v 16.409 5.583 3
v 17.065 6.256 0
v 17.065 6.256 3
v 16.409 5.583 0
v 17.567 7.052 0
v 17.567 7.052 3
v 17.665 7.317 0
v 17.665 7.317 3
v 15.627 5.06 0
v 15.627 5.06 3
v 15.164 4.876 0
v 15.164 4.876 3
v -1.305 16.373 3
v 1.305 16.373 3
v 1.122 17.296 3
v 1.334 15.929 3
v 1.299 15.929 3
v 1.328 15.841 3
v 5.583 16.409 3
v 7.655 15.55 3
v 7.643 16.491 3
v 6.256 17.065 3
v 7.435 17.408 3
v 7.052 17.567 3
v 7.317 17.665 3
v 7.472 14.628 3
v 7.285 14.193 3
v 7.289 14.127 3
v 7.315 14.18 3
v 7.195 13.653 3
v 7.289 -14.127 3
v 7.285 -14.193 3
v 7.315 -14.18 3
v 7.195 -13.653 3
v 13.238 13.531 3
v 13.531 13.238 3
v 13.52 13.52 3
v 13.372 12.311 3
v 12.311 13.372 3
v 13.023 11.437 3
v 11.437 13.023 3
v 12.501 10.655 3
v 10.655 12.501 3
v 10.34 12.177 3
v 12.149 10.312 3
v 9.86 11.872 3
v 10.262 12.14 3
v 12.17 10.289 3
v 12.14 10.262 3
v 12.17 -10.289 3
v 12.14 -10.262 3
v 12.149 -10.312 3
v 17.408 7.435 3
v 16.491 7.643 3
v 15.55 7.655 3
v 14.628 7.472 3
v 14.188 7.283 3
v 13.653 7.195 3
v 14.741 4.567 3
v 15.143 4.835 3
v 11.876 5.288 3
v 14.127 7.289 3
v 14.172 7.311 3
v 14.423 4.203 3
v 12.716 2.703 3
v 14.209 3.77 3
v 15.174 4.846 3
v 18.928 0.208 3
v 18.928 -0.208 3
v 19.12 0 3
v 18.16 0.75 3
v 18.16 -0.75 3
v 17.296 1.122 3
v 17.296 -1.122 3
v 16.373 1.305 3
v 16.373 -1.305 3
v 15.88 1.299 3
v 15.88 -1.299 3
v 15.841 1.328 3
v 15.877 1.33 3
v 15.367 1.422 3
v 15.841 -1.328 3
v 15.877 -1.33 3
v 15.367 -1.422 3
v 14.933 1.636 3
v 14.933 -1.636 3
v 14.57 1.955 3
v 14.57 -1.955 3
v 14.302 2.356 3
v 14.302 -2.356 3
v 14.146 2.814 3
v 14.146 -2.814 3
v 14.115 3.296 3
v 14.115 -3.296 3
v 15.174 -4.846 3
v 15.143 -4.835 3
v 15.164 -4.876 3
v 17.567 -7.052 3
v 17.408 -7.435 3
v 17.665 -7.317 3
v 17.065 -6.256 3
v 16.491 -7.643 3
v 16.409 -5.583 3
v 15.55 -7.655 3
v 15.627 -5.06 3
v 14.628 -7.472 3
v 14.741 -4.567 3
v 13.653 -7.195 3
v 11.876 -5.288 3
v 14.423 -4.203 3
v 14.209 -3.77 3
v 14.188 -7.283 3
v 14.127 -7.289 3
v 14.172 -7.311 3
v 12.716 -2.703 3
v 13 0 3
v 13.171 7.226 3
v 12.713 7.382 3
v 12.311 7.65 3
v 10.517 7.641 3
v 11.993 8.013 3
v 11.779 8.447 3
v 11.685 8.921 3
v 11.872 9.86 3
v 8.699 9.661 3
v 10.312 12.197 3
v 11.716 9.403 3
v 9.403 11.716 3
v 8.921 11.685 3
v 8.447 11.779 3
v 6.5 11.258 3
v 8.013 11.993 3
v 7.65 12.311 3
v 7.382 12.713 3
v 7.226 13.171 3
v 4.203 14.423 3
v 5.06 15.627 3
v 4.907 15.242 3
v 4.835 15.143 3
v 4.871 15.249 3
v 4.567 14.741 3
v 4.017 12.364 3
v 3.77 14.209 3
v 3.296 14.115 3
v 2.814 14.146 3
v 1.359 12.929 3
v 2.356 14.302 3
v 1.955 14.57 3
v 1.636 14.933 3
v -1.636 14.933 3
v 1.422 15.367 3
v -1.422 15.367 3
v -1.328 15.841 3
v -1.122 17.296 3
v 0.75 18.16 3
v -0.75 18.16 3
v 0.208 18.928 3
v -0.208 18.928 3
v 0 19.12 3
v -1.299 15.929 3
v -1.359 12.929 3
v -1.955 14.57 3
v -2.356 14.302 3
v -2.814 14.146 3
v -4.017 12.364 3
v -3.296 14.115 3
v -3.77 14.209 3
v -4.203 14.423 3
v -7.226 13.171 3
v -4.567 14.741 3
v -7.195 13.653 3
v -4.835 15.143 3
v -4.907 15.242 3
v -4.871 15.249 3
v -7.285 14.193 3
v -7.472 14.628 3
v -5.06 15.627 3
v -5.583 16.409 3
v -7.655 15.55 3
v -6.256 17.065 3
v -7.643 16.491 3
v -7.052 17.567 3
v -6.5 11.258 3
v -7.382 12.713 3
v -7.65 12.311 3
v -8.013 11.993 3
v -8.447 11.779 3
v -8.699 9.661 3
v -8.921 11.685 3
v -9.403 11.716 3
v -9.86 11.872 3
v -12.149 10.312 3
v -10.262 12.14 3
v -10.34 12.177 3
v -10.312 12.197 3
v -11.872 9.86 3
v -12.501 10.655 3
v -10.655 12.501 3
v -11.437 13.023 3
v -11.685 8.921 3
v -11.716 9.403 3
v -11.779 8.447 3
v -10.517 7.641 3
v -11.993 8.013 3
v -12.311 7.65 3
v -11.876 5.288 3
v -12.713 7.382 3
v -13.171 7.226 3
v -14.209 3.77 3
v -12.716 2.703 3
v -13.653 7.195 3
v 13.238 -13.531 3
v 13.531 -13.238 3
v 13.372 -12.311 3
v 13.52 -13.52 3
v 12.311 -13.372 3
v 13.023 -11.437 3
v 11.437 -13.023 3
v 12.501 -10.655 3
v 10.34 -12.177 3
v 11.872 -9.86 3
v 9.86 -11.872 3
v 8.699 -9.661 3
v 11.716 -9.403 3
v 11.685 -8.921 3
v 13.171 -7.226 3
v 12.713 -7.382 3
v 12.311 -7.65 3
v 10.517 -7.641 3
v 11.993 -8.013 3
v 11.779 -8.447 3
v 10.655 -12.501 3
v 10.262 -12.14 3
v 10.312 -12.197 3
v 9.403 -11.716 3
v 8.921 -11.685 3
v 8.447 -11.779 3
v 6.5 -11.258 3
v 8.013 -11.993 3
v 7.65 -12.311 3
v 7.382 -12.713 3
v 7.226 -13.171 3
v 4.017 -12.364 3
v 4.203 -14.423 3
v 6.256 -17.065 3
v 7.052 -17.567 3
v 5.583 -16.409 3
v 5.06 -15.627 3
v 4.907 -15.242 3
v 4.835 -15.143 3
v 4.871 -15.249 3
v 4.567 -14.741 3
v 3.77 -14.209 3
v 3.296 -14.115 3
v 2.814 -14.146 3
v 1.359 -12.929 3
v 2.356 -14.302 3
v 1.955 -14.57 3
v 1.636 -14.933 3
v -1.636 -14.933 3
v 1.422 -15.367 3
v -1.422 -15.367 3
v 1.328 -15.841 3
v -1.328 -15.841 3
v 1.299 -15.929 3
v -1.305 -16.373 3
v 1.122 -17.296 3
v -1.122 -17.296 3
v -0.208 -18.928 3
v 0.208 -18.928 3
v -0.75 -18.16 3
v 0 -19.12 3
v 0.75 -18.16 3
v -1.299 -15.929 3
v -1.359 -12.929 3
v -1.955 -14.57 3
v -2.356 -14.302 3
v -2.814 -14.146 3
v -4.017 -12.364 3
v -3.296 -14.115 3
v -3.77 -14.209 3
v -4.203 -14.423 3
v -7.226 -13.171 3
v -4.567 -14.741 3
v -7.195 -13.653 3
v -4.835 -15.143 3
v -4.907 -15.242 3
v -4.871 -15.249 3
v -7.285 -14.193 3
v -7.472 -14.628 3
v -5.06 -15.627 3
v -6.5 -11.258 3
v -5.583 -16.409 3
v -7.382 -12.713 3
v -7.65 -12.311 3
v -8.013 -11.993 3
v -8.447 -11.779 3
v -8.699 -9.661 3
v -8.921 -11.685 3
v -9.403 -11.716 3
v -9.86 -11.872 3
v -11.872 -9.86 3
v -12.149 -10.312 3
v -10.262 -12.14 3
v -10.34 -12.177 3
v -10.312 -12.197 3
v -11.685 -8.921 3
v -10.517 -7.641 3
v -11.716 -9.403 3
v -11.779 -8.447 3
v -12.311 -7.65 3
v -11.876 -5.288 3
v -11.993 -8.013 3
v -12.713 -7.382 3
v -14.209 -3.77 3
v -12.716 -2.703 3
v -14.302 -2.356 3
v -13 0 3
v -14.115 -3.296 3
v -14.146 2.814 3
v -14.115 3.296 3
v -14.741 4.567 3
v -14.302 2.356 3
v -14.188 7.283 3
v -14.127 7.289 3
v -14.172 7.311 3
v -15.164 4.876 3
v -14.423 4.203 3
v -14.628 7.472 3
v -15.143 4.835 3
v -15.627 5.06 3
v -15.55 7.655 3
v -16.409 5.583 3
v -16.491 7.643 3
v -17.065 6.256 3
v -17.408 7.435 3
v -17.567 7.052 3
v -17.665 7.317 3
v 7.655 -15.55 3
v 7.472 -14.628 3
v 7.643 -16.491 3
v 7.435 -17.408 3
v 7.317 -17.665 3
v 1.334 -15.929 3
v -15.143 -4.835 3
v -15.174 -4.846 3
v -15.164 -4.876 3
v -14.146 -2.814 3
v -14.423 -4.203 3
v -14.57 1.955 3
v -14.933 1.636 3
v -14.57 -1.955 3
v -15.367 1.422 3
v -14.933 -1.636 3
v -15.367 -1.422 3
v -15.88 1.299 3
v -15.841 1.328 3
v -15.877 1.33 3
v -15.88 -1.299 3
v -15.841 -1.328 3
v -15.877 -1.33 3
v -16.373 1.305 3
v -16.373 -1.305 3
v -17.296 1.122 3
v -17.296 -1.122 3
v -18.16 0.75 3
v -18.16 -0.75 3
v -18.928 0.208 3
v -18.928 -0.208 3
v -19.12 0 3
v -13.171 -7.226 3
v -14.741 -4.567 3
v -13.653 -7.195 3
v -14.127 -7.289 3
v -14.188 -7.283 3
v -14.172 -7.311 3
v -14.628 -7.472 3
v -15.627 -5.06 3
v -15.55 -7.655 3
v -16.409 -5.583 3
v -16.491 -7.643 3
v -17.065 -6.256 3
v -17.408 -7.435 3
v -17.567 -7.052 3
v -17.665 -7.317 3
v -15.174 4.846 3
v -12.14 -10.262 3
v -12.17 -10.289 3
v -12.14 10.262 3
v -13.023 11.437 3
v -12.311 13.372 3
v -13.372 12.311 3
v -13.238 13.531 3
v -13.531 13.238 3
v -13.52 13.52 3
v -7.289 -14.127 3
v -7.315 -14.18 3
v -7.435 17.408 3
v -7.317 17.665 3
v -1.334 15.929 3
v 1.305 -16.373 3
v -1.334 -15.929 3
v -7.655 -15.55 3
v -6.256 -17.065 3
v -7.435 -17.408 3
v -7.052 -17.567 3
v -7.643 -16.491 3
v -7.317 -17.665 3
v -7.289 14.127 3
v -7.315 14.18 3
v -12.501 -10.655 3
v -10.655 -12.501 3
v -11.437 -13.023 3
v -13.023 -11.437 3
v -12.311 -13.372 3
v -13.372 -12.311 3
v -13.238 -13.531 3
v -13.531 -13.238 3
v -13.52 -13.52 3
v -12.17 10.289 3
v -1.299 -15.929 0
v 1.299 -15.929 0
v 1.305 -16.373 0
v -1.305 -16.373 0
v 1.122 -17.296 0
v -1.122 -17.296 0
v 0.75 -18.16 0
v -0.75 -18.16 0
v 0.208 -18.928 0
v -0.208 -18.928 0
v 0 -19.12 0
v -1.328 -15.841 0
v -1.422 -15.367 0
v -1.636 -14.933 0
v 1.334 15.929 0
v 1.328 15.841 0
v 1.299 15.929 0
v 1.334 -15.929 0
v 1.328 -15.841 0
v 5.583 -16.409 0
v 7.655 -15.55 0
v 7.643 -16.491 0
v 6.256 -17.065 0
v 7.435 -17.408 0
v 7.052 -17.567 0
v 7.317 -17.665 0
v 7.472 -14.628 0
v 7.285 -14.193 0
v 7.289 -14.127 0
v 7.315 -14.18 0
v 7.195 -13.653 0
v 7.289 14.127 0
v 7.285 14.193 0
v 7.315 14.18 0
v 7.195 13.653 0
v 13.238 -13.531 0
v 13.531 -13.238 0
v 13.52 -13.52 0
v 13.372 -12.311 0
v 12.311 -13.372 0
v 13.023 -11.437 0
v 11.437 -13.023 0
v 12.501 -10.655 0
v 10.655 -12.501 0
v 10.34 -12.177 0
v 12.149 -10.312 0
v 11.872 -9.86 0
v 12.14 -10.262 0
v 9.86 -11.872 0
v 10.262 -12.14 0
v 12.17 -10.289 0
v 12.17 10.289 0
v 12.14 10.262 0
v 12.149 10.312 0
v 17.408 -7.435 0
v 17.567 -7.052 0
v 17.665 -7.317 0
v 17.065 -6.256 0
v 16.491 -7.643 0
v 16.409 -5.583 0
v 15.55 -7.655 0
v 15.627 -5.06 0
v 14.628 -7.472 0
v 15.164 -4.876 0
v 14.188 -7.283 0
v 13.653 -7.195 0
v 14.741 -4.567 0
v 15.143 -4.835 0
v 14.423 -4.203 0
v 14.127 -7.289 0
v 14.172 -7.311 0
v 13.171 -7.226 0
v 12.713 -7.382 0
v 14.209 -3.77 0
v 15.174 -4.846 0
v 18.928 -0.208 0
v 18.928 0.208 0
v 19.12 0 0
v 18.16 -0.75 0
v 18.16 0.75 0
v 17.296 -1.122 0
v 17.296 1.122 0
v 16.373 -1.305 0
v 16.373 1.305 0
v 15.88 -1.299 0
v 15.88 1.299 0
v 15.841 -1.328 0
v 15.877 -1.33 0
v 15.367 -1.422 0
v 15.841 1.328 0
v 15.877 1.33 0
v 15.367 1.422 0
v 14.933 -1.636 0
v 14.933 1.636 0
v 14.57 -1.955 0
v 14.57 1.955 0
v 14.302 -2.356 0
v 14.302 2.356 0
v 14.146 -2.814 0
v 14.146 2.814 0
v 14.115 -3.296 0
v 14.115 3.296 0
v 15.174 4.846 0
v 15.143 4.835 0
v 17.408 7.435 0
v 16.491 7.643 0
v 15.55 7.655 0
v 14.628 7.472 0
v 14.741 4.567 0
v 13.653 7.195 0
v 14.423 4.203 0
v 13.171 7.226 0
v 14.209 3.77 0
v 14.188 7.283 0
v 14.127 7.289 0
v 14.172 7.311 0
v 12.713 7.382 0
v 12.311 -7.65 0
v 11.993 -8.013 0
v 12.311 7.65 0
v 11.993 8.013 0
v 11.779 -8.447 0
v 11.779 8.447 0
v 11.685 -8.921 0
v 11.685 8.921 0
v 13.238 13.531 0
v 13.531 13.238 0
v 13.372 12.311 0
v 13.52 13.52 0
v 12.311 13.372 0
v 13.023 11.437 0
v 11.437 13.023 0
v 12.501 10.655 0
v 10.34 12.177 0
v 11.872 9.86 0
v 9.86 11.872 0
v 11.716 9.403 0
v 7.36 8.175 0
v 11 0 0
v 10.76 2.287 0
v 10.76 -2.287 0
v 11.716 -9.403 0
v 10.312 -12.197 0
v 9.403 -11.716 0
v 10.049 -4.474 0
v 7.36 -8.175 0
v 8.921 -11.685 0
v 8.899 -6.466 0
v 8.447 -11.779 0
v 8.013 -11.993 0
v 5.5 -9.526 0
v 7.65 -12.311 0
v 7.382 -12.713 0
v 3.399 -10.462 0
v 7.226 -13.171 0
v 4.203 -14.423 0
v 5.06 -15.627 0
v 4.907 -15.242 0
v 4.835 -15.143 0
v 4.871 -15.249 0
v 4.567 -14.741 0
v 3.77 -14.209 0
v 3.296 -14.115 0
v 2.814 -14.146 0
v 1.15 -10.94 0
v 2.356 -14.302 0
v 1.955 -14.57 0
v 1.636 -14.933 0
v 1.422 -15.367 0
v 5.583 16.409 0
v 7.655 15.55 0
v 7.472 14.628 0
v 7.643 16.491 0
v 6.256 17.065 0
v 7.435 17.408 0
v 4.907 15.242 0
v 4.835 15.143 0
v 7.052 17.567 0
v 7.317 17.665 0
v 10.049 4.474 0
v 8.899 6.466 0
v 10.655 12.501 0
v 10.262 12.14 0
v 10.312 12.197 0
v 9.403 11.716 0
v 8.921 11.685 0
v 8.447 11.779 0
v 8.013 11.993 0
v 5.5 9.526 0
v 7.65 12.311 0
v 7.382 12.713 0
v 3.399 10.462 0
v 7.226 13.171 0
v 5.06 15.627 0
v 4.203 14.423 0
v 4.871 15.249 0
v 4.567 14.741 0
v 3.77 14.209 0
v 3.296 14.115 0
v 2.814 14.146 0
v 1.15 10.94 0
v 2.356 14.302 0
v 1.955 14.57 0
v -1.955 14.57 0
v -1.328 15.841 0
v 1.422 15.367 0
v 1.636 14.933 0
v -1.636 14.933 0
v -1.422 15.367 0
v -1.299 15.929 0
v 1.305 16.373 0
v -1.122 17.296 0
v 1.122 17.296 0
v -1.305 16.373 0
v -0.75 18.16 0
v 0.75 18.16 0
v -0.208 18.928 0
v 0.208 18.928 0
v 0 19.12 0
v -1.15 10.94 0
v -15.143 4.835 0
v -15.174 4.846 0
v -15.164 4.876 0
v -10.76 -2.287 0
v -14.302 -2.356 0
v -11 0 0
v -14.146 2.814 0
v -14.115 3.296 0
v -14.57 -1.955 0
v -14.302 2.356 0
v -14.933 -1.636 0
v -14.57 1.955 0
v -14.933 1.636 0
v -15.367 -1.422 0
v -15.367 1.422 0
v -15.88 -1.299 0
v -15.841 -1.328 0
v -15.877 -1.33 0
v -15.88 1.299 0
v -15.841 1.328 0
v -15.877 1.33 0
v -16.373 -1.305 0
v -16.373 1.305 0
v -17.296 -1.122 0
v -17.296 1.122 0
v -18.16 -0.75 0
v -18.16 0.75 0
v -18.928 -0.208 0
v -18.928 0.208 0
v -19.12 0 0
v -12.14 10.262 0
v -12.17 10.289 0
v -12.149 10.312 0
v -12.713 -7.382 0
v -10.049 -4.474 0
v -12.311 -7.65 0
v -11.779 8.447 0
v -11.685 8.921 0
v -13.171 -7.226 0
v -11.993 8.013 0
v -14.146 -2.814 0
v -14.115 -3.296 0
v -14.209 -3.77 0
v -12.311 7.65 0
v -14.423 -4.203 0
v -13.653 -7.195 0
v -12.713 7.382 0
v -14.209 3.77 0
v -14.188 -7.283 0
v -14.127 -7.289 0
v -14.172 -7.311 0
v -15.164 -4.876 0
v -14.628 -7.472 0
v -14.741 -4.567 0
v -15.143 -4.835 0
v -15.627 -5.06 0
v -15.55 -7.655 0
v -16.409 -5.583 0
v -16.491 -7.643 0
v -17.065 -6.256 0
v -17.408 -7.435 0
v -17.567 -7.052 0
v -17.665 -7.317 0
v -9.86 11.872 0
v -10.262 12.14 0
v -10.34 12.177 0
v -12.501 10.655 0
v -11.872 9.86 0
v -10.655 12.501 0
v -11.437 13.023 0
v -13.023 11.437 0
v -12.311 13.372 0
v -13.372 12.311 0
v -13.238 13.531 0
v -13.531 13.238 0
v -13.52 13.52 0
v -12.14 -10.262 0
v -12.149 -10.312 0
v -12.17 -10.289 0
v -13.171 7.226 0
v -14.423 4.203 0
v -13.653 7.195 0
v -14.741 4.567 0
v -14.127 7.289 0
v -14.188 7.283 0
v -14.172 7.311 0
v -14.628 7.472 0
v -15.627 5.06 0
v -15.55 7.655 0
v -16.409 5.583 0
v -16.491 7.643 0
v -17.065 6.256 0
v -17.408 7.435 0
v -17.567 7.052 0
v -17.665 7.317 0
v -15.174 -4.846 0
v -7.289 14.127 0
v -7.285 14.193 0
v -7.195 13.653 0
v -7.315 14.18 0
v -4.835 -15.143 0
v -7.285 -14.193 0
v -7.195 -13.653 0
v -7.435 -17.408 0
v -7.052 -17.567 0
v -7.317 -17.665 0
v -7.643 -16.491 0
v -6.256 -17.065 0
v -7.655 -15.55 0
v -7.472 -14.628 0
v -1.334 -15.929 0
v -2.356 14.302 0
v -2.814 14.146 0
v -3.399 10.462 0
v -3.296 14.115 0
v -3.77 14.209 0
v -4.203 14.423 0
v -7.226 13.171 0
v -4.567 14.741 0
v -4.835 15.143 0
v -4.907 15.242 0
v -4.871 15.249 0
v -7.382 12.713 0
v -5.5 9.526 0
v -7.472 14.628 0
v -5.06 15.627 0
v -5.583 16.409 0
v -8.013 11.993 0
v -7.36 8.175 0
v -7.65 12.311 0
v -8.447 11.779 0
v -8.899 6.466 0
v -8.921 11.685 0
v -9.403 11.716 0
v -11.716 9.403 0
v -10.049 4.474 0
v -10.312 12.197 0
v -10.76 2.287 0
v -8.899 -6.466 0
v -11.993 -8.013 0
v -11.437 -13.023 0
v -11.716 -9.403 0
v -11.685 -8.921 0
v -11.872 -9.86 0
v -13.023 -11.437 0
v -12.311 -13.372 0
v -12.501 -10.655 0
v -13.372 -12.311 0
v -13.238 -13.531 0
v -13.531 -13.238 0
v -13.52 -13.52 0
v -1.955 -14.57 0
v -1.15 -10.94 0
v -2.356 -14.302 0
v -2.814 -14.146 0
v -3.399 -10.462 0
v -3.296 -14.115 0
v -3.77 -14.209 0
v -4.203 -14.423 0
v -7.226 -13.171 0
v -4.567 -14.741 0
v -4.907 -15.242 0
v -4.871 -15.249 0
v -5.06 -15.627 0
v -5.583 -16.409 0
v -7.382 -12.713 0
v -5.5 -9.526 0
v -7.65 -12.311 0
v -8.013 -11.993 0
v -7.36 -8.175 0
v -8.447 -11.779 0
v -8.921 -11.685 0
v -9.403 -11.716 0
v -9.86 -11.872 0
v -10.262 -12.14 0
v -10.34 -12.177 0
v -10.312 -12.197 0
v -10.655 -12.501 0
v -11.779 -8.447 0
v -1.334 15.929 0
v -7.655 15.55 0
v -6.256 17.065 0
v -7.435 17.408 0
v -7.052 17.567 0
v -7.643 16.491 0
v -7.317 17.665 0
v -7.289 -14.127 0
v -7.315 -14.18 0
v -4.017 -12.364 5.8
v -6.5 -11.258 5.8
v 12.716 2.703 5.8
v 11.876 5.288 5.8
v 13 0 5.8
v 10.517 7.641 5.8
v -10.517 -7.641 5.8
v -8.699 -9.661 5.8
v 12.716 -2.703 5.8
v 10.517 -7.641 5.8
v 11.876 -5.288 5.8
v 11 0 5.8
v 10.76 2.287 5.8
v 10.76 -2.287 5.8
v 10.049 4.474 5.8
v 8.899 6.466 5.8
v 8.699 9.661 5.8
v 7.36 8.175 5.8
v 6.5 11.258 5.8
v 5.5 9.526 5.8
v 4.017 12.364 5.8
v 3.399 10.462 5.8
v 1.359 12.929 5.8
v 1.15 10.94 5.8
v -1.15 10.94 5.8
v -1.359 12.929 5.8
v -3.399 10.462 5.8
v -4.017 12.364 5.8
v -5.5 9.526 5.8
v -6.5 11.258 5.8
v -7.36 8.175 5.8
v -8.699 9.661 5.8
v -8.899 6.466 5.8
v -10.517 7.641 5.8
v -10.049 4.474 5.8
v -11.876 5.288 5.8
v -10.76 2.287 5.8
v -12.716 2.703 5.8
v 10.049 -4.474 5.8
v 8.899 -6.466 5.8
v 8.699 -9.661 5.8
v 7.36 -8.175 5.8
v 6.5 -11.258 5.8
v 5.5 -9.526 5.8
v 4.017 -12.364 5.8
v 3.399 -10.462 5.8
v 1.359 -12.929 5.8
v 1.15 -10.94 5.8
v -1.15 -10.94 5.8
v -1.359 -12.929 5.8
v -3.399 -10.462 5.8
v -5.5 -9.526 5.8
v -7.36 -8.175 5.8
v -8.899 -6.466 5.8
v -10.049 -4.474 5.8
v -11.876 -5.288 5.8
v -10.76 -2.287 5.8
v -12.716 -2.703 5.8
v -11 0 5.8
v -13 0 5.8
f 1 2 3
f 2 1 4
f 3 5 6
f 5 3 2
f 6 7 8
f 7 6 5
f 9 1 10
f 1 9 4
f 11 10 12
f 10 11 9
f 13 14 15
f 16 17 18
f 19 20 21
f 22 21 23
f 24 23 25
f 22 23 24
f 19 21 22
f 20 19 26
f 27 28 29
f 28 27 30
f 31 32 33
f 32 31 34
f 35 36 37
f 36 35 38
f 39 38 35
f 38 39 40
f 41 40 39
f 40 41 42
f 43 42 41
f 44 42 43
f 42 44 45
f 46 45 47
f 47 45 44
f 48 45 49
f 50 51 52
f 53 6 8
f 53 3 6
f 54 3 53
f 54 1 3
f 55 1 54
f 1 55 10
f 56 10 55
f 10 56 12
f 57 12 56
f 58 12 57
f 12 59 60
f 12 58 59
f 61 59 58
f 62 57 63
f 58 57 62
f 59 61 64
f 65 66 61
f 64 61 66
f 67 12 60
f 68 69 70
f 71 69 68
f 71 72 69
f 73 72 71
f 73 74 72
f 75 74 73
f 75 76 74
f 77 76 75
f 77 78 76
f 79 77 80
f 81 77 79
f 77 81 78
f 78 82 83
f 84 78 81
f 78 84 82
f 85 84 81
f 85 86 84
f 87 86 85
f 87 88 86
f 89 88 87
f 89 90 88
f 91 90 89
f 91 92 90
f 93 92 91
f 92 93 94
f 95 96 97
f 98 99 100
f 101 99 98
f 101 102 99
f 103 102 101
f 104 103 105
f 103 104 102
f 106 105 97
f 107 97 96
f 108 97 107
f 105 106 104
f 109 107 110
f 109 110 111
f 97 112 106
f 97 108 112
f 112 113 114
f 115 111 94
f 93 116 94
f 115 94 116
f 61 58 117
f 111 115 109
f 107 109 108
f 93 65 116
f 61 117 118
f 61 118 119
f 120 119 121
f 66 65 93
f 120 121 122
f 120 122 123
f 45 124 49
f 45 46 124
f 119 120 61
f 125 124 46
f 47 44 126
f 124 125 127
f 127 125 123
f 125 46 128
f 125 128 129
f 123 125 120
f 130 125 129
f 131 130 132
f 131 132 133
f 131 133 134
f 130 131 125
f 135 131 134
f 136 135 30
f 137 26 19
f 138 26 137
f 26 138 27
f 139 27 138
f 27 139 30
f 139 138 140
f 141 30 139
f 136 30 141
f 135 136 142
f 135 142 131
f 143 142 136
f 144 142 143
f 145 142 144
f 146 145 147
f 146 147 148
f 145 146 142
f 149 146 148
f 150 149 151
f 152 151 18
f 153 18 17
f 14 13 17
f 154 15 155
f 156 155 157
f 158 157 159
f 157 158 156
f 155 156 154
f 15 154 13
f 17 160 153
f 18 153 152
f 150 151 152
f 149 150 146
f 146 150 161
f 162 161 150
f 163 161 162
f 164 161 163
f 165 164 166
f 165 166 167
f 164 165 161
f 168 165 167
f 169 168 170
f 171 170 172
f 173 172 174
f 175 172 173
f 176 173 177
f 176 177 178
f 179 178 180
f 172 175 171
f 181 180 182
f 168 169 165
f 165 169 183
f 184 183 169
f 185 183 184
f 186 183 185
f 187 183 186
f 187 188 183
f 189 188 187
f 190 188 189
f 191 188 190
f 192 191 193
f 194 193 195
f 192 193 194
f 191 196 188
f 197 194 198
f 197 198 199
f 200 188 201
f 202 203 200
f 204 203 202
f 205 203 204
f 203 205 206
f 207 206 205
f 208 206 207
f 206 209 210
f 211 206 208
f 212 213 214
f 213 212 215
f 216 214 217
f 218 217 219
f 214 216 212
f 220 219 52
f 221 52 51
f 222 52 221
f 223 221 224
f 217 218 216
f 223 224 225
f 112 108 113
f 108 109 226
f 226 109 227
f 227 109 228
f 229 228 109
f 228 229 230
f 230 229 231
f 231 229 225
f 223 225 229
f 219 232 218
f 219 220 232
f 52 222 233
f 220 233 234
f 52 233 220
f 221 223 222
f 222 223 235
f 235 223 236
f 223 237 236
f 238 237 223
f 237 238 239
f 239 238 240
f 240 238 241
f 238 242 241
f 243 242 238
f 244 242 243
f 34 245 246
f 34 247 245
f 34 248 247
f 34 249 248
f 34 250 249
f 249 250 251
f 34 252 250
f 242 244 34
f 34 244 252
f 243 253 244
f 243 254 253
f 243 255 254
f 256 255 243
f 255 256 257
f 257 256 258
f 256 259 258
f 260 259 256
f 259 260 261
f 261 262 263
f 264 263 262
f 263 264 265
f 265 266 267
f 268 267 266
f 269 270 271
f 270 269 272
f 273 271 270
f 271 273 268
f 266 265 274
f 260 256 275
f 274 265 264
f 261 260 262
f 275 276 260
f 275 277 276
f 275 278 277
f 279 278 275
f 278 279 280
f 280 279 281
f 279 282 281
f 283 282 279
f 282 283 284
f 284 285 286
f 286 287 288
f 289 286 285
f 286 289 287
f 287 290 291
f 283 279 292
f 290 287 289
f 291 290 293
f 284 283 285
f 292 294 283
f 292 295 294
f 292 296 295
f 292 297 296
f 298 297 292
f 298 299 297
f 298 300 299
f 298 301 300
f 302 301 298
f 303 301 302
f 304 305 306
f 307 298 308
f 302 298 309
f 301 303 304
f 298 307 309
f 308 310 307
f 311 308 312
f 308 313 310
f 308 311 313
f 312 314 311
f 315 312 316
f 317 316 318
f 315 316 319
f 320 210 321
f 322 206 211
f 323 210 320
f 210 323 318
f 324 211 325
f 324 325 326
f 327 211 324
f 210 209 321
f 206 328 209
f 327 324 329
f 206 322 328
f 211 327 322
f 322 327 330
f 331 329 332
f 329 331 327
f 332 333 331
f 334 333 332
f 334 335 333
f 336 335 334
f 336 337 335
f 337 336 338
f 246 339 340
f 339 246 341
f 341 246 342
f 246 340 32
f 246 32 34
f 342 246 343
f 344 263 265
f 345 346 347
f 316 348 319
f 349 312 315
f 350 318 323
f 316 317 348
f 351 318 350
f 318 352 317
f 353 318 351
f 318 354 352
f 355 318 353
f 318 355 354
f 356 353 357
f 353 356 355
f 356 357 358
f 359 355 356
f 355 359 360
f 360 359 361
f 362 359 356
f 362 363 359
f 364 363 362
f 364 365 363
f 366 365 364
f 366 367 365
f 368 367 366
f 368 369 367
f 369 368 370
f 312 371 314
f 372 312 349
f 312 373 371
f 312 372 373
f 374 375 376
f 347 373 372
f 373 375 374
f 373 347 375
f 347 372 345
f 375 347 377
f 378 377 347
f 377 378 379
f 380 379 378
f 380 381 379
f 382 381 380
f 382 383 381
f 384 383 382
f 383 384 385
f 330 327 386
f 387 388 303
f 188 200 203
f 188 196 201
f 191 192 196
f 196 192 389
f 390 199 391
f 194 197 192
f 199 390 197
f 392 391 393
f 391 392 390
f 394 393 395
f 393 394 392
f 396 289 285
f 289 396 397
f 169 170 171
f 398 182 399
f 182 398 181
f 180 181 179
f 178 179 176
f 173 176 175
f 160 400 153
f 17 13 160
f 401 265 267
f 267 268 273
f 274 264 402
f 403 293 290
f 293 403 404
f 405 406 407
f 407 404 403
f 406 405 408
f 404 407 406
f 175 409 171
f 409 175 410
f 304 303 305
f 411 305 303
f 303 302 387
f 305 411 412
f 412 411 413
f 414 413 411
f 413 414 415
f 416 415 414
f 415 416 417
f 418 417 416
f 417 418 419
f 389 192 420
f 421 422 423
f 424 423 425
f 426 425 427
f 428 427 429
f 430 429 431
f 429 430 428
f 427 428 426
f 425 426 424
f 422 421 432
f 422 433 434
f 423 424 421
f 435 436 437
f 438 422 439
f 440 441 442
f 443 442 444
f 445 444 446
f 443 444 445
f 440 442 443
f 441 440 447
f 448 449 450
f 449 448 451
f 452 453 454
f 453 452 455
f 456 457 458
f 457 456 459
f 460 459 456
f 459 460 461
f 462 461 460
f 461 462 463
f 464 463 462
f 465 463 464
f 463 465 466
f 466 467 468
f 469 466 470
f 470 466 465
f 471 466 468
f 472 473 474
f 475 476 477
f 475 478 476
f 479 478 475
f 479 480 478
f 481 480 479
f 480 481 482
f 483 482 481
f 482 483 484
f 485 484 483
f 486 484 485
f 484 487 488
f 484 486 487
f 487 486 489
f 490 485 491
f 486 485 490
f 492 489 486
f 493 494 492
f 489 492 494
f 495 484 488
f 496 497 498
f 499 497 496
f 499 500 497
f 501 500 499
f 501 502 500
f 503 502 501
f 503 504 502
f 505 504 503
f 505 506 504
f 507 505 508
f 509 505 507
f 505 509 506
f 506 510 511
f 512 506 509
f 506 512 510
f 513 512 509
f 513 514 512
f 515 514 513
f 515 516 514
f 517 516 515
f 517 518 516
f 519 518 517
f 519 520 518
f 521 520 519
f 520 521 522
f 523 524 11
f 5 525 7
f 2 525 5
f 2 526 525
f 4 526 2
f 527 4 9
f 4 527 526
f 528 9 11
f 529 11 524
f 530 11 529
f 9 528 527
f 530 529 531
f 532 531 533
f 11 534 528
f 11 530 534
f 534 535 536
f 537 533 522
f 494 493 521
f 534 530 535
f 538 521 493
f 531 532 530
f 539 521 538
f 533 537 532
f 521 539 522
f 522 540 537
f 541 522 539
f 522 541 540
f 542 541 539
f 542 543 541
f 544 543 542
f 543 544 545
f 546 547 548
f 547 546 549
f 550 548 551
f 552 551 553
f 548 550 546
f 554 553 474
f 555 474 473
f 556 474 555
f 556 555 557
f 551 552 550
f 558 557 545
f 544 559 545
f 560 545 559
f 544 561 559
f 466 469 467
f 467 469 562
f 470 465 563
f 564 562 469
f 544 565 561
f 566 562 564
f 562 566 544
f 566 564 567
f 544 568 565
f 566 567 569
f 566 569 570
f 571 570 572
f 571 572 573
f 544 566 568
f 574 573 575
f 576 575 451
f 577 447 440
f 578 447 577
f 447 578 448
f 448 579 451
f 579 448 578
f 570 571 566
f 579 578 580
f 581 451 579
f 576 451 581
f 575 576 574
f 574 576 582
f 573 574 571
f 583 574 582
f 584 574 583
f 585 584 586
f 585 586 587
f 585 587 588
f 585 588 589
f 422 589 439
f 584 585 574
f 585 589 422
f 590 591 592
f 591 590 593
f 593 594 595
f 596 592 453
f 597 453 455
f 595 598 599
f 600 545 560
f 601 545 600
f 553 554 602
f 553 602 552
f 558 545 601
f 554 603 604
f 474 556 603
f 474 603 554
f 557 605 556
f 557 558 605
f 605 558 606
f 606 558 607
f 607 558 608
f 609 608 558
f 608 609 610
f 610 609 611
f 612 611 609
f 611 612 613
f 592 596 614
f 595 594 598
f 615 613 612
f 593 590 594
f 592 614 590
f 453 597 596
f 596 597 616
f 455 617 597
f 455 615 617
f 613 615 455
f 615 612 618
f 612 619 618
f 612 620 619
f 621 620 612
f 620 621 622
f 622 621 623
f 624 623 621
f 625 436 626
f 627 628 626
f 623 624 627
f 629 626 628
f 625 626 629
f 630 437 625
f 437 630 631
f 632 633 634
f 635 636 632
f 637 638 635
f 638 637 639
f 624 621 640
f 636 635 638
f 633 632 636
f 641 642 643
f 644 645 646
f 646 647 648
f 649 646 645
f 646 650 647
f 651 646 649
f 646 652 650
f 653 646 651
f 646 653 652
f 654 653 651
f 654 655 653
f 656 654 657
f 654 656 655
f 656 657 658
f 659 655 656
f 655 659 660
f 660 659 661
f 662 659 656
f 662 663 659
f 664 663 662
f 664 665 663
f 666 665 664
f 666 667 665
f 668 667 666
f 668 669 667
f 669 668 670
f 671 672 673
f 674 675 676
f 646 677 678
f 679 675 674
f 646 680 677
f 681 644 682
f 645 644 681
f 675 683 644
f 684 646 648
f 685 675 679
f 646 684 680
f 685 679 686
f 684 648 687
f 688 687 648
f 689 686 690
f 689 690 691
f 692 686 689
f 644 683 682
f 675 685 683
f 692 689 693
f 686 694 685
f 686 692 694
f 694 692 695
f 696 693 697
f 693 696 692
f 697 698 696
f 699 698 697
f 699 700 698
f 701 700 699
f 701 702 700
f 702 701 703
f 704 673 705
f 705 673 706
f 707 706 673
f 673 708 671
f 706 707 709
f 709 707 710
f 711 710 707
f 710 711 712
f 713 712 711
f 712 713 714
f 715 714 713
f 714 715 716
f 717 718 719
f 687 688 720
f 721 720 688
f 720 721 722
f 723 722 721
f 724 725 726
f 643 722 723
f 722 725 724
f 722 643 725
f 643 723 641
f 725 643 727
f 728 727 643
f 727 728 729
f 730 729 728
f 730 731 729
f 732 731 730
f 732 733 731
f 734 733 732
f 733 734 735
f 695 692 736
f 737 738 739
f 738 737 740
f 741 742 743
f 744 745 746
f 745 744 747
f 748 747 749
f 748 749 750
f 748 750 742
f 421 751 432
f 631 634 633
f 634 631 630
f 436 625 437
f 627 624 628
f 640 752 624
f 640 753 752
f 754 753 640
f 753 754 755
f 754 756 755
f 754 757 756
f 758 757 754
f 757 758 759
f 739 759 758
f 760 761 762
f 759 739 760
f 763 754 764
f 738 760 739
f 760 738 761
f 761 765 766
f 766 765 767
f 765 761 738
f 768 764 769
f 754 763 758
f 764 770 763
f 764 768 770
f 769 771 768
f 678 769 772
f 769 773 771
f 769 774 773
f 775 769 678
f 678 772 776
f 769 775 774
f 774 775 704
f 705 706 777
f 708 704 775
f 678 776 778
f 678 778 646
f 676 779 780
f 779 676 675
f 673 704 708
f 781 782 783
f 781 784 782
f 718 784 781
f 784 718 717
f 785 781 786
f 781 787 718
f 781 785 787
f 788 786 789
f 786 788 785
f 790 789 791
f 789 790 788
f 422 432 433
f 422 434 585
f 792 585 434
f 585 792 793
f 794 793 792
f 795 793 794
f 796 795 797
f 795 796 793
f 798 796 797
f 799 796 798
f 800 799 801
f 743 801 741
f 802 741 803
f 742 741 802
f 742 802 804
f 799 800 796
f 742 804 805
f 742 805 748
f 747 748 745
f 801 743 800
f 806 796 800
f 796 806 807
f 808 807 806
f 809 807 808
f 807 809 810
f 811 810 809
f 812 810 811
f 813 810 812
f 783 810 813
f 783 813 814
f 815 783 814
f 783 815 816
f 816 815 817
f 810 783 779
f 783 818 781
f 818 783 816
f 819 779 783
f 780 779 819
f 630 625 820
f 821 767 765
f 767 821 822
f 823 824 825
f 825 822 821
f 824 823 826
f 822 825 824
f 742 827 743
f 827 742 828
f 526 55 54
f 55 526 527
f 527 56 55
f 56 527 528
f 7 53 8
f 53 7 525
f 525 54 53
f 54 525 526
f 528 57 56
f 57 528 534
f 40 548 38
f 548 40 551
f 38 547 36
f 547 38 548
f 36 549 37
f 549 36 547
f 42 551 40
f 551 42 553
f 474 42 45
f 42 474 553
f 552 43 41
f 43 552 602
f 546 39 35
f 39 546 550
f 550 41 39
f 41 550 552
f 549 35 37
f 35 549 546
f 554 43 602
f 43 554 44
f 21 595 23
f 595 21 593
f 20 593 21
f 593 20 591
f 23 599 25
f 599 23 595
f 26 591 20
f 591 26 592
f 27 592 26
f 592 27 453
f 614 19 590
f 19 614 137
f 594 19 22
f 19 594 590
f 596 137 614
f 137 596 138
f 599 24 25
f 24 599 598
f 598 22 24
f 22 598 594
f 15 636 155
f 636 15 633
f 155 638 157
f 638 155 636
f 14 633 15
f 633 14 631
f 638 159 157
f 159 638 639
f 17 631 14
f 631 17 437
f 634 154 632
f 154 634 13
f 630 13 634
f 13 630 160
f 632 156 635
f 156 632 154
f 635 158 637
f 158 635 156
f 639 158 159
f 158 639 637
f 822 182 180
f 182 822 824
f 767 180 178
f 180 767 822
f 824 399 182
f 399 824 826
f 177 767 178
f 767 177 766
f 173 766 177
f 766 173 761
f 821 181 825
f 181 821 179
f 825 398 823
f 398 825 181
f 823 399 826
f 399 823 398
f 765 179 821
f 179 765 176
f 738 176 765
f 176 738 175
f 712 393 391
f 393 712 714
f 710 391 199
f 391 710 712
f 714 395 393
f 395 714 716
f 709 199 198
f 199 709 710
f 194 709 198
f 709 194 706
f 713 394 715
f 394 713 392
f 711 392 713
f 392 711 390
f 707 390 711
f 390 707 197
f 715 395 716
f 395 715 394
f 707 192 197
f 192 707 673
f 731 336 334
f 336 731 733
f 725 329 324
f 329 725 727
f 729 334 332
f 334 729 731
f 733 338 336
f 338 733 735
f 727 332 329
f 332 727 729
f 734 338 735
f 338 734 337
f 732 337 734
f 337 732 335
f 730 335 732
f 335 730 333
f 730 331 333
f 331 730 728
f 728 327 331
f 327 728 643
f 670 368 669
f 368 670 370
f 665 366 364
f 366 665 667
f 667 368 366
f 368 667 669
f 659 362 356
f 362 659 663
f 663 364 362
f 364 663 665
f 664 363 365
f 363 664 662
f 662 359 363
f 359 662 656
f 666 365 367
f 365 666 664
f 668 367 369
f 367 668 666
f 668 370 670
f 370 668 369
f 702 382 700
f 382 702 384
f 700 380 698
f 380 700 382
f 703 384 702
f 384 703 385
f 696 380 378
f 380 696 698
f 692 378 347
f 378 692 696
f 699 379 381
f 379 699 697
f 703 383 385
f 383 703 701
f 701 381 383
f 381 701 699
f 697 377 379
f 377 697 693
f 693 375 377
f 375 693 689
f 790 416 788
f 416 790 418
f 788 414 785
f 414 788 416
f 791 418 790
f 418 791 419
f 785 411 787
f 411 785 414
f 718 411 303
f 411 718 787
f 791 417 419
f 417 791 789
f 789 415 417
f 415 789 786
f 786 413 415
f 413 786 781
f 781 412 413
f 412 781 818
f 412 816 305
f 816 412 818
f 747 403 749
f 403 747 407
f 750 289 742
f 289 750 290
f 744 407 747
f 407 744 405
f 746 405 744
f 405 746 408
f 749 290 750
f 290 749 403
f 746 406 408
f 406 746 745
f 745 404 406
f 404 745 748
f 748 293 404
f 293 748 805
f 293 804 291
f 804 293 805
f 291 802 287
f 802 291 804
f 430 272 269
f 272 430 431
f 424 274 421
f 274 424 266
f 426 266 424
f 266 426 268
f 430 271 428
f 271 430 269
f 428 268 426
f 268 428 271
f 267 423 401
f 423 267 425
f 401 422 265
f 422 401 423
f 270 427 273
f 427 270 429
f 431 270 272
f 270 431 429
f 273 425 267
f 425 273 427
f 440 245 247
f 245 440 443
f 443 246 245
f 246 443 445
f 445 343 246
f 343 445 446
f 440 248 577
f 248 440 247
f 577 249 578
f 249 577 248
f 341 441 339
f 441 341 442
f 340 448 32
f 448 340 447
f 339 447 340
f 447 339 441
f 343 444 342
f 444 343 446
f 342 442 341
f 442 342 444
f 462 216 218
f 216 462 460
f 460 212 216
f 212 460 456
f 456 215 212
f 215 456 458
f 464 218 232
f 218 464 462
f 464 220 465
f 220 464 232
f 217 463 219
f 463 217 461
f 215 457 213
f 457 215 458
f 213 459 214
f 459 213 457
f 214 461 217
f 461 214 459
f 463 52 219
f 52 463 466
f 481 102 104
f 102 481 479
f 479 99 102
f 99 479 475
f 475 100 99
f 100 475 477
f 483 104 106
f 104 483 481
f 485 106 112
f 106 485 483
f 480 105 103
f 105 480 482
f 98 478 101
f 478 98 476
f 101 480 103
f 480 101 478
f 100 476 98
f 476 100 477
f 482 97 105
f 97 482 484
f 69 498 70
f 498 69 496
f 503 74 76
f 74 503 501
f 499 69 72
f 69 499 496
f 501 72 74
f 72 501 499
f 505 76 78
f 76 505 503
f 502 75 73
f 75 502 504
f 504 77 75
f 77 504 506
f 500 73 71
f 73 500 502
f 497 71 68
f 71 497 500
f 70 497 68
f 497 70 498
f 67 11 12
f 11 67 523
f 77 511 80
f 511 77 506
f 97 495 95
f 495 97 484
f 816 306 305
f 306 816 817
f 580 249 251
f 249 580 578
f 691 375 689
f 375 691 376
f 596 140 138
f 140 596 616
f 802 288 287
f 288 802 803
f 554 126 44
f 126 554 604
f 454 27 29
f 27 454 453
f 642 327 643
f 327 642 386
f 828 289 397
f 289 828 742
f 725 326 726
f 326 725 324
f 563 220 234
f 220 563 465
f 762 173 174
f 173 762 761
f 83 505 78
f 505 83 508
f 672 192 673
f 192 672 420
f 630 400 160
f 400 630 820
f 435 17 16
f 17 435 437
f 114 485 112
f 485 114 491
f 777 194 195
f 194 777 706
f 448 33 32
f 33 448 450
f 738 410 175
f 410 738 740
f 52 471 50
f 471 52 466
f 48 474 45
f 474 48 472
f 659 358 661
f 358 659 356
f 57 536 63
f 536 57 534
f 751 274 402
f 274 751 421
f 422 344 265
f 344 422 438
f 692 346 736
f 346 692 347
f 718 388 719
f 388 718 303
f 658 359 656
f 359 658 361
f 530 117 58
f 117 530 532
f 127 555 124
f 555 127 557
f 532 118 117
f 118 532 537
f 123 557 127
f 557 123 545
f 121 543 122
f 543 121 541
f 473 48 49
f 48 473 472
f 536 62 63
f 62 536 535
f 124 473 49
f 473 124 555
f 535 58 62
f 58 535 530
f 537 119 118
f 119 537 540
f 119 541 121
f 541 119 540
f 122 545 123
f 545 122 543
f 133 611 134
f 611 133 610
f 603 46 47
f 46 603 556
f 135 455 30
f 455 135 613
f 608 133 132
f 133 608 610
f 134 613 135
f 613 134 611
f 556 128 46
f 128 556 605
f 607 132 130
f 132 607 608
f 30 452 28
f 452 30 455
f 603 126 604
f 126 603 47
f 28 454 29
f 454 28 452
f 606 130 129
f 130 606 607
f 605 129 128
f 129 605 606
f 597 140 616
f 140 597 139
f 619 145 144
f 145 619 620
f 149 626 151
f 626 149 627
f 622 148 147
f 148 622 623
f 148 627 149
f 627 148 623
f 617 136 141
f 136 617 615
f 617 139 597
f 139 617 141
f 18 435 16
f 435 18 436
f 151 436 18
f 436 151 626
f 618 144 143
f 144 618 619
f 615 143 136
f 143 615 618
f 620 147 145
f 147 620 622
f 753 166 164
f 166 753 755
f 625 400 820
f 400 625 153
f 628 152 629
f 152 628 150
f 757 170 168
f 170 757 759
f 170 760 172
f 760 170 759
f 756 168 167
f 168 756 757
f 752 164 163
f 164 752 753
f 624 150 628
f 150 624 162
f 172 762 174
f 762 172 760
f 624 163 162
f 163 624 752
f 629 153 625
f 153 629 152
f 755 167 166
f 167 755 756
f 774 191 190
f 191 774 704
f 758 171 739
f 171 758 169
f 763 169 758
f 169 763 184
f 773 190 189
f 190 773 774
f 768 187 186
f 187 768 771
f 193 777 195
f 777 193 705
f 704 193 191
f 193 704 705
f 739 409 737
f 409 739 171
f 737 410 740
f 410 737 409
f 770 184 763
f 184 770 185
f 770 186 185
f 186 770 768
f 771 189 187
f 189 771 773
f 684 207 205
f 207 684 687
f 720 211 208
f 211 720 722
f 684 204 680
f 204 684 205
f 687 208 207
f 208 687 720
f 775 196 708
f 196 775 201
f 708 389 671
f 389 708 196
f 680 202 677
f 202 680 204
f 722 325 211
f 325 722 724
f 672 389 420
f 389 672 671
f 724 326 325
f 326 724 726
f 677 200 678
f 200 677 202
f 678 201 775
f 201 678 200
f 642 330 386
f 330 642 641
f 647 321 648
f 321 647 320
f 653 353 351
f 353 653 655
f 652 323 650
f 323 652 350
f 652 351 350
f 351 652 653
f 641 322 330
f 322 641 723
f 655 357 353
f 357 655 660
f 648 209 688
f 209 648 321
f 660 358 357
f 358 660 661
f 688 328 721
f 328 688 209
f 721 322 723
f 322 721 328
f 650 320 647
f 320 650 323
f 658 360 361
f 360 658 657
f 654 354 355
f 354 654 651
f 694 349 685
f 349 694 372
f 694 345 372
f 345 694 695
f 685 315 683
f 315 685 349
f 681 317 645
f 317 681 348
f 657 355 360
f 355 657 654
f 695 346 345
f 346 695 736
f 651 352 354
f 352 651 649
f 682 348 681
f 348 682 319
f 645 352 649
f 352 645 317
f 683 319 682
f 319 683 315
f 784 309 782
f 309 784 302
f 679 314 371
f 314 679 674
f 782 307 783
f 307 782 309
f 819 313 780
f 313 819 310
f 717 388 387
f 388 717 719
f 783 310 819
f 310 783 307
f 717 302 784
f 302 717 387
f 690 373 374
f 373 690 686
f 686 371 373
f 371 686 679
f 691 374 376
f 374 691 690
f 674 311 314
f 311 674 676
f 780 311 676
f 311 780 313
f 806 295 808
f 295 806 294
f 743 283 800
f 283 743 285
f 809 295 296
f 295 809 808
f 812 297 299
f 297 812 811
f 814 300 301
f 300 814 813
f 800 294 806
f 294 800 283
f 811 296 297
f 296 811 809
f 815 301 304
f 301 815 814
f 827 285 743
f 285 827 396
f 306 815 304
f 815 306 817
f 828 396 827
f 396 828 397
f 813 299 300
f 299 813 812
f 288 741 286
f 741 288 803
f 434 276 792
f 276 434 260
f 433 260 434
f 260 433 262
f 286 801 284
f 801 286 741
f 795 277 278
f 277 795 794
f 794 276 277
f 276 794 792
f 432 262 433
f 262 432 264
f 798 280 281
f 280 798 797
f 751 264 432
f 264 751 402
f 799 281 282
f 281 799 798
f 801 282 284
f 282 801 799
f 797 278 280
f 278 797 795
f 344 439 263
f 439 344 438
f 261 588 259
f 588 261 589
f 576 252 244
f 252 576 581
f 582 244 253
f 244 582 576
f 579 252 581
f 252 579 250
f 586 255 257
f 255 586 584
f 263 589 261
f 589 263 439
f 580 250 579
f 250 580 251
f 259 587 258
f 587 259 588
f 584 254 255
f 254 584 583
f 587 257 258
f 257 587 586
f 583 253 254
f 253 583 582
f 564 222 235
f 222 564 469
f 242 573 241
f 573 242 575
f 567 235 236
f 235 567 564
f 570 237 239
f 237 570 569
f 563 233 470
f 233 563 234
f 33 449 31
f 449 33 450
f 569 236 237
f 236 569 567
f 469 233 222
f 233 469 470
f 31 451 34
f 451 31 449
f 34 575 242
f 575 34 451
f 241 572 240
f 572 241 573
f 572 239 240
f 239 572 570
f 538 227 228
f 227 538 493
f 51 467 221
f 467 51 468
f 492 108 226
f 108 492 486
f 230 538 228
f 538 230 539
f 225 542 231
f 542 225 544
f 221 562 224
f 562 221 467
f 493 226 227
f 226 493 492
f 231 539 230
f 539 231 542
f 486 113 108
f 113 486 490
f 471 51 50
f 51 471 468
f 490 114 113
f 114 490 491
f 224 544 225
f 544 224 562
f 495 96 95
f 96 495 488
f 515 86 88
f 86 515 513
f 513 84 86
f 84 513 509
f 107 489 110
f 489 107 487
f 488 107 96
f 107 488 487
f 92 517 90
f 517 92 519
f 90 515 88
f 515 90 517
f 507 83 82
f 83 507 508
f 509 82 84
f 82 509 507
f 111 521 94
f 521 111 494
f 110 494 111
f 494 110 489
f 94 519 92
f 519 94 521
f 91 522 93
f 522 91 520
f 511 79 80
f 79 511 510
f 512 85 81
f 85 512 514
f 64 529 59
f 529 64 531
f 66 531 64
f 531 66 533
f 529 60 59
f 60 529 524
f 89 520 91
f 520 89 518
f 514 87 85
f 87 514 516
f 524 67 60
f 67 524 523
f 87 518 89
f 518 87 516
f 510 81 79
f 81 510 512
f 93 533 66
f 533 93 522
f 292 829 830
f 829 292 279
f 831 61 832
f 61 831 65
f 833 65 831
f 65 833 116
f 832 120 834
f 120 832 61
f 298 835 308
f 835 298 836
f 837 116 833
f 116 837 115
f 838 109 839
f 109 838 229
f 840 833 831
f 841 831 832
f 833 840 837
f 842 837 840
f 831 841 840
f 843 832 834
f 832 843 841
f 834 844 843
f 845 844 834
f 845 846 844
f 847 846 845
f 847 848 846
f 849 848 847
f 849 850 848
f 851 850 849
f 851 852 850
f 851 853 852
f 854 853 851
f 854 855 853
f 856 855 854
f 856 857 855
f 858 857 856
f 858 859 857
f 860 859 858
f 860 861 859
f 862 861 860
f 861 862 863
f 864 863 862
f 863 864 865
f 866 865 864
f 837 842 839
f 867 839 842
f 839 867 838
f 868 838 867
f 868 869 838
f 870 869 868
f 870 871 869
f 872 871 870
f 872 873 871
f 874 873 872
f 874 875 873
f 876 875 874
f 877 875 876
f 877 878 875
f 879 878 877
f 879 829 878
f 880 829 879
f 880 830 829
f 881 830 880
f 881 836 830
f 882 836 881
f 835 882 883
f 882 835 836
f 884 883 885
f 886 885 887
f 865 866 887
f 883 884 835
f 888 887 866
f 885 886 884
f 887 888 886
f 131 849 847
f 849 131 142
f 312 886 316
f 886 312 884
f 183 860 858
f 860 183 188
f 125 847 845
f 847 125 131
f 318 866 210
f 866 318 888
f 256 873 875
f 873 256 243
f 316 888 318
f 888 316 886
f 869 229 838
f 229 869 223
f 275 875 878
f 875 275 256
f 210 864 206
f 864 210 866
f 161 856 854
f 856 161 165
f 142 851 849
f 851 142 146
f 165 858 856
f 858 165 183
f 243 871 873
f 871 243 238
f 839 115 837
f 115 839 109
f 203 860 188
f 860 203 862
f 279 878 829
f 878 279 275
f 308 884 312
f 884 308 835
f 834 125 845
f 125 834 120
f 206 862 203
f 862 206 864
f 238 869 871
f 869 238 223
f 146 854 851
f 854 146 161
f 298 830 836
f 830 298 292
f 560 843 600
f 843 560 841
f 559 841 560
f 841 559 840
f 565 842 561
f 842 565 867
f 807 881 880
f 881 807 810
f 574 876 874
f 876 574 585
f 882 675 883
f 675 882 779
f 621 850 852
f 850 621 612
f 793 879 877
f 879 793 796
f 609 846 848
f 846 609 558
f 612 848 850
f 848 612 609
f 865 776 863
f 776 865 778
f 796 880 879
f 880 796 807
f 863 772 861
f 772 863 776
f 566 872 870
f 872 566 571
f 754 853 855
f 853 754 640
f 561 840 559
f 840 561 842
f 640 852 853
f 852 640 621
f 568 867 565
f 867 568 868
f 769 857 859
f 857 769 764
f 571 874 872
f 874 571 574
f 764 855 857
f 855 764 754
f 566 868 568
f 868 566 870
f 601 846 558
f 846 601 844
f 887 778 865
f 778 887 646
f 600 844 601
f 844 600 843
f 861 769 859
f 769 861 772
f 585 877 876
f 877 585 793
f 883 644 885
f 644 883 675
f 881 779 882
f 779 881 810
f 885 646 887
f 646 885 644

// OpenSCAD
use <MCAD/bearing.scad>

module sprocket(teeth=20, roller=3, pitch=17, thickness=3, tolerance=0.2){
	$fs=0.5;
	roller=roller/2; //We need radius in our calculations, not diameter
	distance_from_center=pitch/(2*sin(180/teeth));
	echo(distance_from_center);
	angle=(360/teeth);
	pitch_circle=sqrt((distance_from_center*distance_from_center) - (pitch*(roller+tolerance))+((roller+tolerance)*(roller+tolerance)));
	echo(pitch_circle);
	difference(){
		union(){
			cylinder(r=pitch_circle,h=thickness);
			for(tooth=[1:teeth]){
				intersection(){
					rotate(a=[0,0,angle*(tooth+0.5)]){
						translate([distance_from_center,0,0]){
							cylinder(r=pitch-roller-tolerance,h=thickness);
						}
					}
					rotate(a=[0,0,angle*(tooth-0.5)]){
						translate([distance_from_center,0,0]){
							cylinder(r=pitch-roller-tolerance,h=thickness);
						}
					}
				}
			}
		}
		for(tooth=[1:teeth]){
			rotate(a=[0,0,angle*(tooth+0.5)]){
				translate([distance_from_center,0,-1]){
					cylinder(r=roller+tolerance,h=thickness+2);
				}
			}
		}
	}
}

thick= 0.126*25.4;
d= bearingOuterDiameter(608);
w= bearingWidth(608);

// #25
difference() {
	union() {
		sprocket(16,0.13*25.4,0.25*25.4,thick-0.2,0.2);
		translate([0,0,thick-0.3]) cylinder(r= d/2+2, h= w/2-thick/2+1);
	}
	cylinder(r=d/2, h= thick+w);
}

%translate([0,0,-w/2+thick/2]) bearing();
